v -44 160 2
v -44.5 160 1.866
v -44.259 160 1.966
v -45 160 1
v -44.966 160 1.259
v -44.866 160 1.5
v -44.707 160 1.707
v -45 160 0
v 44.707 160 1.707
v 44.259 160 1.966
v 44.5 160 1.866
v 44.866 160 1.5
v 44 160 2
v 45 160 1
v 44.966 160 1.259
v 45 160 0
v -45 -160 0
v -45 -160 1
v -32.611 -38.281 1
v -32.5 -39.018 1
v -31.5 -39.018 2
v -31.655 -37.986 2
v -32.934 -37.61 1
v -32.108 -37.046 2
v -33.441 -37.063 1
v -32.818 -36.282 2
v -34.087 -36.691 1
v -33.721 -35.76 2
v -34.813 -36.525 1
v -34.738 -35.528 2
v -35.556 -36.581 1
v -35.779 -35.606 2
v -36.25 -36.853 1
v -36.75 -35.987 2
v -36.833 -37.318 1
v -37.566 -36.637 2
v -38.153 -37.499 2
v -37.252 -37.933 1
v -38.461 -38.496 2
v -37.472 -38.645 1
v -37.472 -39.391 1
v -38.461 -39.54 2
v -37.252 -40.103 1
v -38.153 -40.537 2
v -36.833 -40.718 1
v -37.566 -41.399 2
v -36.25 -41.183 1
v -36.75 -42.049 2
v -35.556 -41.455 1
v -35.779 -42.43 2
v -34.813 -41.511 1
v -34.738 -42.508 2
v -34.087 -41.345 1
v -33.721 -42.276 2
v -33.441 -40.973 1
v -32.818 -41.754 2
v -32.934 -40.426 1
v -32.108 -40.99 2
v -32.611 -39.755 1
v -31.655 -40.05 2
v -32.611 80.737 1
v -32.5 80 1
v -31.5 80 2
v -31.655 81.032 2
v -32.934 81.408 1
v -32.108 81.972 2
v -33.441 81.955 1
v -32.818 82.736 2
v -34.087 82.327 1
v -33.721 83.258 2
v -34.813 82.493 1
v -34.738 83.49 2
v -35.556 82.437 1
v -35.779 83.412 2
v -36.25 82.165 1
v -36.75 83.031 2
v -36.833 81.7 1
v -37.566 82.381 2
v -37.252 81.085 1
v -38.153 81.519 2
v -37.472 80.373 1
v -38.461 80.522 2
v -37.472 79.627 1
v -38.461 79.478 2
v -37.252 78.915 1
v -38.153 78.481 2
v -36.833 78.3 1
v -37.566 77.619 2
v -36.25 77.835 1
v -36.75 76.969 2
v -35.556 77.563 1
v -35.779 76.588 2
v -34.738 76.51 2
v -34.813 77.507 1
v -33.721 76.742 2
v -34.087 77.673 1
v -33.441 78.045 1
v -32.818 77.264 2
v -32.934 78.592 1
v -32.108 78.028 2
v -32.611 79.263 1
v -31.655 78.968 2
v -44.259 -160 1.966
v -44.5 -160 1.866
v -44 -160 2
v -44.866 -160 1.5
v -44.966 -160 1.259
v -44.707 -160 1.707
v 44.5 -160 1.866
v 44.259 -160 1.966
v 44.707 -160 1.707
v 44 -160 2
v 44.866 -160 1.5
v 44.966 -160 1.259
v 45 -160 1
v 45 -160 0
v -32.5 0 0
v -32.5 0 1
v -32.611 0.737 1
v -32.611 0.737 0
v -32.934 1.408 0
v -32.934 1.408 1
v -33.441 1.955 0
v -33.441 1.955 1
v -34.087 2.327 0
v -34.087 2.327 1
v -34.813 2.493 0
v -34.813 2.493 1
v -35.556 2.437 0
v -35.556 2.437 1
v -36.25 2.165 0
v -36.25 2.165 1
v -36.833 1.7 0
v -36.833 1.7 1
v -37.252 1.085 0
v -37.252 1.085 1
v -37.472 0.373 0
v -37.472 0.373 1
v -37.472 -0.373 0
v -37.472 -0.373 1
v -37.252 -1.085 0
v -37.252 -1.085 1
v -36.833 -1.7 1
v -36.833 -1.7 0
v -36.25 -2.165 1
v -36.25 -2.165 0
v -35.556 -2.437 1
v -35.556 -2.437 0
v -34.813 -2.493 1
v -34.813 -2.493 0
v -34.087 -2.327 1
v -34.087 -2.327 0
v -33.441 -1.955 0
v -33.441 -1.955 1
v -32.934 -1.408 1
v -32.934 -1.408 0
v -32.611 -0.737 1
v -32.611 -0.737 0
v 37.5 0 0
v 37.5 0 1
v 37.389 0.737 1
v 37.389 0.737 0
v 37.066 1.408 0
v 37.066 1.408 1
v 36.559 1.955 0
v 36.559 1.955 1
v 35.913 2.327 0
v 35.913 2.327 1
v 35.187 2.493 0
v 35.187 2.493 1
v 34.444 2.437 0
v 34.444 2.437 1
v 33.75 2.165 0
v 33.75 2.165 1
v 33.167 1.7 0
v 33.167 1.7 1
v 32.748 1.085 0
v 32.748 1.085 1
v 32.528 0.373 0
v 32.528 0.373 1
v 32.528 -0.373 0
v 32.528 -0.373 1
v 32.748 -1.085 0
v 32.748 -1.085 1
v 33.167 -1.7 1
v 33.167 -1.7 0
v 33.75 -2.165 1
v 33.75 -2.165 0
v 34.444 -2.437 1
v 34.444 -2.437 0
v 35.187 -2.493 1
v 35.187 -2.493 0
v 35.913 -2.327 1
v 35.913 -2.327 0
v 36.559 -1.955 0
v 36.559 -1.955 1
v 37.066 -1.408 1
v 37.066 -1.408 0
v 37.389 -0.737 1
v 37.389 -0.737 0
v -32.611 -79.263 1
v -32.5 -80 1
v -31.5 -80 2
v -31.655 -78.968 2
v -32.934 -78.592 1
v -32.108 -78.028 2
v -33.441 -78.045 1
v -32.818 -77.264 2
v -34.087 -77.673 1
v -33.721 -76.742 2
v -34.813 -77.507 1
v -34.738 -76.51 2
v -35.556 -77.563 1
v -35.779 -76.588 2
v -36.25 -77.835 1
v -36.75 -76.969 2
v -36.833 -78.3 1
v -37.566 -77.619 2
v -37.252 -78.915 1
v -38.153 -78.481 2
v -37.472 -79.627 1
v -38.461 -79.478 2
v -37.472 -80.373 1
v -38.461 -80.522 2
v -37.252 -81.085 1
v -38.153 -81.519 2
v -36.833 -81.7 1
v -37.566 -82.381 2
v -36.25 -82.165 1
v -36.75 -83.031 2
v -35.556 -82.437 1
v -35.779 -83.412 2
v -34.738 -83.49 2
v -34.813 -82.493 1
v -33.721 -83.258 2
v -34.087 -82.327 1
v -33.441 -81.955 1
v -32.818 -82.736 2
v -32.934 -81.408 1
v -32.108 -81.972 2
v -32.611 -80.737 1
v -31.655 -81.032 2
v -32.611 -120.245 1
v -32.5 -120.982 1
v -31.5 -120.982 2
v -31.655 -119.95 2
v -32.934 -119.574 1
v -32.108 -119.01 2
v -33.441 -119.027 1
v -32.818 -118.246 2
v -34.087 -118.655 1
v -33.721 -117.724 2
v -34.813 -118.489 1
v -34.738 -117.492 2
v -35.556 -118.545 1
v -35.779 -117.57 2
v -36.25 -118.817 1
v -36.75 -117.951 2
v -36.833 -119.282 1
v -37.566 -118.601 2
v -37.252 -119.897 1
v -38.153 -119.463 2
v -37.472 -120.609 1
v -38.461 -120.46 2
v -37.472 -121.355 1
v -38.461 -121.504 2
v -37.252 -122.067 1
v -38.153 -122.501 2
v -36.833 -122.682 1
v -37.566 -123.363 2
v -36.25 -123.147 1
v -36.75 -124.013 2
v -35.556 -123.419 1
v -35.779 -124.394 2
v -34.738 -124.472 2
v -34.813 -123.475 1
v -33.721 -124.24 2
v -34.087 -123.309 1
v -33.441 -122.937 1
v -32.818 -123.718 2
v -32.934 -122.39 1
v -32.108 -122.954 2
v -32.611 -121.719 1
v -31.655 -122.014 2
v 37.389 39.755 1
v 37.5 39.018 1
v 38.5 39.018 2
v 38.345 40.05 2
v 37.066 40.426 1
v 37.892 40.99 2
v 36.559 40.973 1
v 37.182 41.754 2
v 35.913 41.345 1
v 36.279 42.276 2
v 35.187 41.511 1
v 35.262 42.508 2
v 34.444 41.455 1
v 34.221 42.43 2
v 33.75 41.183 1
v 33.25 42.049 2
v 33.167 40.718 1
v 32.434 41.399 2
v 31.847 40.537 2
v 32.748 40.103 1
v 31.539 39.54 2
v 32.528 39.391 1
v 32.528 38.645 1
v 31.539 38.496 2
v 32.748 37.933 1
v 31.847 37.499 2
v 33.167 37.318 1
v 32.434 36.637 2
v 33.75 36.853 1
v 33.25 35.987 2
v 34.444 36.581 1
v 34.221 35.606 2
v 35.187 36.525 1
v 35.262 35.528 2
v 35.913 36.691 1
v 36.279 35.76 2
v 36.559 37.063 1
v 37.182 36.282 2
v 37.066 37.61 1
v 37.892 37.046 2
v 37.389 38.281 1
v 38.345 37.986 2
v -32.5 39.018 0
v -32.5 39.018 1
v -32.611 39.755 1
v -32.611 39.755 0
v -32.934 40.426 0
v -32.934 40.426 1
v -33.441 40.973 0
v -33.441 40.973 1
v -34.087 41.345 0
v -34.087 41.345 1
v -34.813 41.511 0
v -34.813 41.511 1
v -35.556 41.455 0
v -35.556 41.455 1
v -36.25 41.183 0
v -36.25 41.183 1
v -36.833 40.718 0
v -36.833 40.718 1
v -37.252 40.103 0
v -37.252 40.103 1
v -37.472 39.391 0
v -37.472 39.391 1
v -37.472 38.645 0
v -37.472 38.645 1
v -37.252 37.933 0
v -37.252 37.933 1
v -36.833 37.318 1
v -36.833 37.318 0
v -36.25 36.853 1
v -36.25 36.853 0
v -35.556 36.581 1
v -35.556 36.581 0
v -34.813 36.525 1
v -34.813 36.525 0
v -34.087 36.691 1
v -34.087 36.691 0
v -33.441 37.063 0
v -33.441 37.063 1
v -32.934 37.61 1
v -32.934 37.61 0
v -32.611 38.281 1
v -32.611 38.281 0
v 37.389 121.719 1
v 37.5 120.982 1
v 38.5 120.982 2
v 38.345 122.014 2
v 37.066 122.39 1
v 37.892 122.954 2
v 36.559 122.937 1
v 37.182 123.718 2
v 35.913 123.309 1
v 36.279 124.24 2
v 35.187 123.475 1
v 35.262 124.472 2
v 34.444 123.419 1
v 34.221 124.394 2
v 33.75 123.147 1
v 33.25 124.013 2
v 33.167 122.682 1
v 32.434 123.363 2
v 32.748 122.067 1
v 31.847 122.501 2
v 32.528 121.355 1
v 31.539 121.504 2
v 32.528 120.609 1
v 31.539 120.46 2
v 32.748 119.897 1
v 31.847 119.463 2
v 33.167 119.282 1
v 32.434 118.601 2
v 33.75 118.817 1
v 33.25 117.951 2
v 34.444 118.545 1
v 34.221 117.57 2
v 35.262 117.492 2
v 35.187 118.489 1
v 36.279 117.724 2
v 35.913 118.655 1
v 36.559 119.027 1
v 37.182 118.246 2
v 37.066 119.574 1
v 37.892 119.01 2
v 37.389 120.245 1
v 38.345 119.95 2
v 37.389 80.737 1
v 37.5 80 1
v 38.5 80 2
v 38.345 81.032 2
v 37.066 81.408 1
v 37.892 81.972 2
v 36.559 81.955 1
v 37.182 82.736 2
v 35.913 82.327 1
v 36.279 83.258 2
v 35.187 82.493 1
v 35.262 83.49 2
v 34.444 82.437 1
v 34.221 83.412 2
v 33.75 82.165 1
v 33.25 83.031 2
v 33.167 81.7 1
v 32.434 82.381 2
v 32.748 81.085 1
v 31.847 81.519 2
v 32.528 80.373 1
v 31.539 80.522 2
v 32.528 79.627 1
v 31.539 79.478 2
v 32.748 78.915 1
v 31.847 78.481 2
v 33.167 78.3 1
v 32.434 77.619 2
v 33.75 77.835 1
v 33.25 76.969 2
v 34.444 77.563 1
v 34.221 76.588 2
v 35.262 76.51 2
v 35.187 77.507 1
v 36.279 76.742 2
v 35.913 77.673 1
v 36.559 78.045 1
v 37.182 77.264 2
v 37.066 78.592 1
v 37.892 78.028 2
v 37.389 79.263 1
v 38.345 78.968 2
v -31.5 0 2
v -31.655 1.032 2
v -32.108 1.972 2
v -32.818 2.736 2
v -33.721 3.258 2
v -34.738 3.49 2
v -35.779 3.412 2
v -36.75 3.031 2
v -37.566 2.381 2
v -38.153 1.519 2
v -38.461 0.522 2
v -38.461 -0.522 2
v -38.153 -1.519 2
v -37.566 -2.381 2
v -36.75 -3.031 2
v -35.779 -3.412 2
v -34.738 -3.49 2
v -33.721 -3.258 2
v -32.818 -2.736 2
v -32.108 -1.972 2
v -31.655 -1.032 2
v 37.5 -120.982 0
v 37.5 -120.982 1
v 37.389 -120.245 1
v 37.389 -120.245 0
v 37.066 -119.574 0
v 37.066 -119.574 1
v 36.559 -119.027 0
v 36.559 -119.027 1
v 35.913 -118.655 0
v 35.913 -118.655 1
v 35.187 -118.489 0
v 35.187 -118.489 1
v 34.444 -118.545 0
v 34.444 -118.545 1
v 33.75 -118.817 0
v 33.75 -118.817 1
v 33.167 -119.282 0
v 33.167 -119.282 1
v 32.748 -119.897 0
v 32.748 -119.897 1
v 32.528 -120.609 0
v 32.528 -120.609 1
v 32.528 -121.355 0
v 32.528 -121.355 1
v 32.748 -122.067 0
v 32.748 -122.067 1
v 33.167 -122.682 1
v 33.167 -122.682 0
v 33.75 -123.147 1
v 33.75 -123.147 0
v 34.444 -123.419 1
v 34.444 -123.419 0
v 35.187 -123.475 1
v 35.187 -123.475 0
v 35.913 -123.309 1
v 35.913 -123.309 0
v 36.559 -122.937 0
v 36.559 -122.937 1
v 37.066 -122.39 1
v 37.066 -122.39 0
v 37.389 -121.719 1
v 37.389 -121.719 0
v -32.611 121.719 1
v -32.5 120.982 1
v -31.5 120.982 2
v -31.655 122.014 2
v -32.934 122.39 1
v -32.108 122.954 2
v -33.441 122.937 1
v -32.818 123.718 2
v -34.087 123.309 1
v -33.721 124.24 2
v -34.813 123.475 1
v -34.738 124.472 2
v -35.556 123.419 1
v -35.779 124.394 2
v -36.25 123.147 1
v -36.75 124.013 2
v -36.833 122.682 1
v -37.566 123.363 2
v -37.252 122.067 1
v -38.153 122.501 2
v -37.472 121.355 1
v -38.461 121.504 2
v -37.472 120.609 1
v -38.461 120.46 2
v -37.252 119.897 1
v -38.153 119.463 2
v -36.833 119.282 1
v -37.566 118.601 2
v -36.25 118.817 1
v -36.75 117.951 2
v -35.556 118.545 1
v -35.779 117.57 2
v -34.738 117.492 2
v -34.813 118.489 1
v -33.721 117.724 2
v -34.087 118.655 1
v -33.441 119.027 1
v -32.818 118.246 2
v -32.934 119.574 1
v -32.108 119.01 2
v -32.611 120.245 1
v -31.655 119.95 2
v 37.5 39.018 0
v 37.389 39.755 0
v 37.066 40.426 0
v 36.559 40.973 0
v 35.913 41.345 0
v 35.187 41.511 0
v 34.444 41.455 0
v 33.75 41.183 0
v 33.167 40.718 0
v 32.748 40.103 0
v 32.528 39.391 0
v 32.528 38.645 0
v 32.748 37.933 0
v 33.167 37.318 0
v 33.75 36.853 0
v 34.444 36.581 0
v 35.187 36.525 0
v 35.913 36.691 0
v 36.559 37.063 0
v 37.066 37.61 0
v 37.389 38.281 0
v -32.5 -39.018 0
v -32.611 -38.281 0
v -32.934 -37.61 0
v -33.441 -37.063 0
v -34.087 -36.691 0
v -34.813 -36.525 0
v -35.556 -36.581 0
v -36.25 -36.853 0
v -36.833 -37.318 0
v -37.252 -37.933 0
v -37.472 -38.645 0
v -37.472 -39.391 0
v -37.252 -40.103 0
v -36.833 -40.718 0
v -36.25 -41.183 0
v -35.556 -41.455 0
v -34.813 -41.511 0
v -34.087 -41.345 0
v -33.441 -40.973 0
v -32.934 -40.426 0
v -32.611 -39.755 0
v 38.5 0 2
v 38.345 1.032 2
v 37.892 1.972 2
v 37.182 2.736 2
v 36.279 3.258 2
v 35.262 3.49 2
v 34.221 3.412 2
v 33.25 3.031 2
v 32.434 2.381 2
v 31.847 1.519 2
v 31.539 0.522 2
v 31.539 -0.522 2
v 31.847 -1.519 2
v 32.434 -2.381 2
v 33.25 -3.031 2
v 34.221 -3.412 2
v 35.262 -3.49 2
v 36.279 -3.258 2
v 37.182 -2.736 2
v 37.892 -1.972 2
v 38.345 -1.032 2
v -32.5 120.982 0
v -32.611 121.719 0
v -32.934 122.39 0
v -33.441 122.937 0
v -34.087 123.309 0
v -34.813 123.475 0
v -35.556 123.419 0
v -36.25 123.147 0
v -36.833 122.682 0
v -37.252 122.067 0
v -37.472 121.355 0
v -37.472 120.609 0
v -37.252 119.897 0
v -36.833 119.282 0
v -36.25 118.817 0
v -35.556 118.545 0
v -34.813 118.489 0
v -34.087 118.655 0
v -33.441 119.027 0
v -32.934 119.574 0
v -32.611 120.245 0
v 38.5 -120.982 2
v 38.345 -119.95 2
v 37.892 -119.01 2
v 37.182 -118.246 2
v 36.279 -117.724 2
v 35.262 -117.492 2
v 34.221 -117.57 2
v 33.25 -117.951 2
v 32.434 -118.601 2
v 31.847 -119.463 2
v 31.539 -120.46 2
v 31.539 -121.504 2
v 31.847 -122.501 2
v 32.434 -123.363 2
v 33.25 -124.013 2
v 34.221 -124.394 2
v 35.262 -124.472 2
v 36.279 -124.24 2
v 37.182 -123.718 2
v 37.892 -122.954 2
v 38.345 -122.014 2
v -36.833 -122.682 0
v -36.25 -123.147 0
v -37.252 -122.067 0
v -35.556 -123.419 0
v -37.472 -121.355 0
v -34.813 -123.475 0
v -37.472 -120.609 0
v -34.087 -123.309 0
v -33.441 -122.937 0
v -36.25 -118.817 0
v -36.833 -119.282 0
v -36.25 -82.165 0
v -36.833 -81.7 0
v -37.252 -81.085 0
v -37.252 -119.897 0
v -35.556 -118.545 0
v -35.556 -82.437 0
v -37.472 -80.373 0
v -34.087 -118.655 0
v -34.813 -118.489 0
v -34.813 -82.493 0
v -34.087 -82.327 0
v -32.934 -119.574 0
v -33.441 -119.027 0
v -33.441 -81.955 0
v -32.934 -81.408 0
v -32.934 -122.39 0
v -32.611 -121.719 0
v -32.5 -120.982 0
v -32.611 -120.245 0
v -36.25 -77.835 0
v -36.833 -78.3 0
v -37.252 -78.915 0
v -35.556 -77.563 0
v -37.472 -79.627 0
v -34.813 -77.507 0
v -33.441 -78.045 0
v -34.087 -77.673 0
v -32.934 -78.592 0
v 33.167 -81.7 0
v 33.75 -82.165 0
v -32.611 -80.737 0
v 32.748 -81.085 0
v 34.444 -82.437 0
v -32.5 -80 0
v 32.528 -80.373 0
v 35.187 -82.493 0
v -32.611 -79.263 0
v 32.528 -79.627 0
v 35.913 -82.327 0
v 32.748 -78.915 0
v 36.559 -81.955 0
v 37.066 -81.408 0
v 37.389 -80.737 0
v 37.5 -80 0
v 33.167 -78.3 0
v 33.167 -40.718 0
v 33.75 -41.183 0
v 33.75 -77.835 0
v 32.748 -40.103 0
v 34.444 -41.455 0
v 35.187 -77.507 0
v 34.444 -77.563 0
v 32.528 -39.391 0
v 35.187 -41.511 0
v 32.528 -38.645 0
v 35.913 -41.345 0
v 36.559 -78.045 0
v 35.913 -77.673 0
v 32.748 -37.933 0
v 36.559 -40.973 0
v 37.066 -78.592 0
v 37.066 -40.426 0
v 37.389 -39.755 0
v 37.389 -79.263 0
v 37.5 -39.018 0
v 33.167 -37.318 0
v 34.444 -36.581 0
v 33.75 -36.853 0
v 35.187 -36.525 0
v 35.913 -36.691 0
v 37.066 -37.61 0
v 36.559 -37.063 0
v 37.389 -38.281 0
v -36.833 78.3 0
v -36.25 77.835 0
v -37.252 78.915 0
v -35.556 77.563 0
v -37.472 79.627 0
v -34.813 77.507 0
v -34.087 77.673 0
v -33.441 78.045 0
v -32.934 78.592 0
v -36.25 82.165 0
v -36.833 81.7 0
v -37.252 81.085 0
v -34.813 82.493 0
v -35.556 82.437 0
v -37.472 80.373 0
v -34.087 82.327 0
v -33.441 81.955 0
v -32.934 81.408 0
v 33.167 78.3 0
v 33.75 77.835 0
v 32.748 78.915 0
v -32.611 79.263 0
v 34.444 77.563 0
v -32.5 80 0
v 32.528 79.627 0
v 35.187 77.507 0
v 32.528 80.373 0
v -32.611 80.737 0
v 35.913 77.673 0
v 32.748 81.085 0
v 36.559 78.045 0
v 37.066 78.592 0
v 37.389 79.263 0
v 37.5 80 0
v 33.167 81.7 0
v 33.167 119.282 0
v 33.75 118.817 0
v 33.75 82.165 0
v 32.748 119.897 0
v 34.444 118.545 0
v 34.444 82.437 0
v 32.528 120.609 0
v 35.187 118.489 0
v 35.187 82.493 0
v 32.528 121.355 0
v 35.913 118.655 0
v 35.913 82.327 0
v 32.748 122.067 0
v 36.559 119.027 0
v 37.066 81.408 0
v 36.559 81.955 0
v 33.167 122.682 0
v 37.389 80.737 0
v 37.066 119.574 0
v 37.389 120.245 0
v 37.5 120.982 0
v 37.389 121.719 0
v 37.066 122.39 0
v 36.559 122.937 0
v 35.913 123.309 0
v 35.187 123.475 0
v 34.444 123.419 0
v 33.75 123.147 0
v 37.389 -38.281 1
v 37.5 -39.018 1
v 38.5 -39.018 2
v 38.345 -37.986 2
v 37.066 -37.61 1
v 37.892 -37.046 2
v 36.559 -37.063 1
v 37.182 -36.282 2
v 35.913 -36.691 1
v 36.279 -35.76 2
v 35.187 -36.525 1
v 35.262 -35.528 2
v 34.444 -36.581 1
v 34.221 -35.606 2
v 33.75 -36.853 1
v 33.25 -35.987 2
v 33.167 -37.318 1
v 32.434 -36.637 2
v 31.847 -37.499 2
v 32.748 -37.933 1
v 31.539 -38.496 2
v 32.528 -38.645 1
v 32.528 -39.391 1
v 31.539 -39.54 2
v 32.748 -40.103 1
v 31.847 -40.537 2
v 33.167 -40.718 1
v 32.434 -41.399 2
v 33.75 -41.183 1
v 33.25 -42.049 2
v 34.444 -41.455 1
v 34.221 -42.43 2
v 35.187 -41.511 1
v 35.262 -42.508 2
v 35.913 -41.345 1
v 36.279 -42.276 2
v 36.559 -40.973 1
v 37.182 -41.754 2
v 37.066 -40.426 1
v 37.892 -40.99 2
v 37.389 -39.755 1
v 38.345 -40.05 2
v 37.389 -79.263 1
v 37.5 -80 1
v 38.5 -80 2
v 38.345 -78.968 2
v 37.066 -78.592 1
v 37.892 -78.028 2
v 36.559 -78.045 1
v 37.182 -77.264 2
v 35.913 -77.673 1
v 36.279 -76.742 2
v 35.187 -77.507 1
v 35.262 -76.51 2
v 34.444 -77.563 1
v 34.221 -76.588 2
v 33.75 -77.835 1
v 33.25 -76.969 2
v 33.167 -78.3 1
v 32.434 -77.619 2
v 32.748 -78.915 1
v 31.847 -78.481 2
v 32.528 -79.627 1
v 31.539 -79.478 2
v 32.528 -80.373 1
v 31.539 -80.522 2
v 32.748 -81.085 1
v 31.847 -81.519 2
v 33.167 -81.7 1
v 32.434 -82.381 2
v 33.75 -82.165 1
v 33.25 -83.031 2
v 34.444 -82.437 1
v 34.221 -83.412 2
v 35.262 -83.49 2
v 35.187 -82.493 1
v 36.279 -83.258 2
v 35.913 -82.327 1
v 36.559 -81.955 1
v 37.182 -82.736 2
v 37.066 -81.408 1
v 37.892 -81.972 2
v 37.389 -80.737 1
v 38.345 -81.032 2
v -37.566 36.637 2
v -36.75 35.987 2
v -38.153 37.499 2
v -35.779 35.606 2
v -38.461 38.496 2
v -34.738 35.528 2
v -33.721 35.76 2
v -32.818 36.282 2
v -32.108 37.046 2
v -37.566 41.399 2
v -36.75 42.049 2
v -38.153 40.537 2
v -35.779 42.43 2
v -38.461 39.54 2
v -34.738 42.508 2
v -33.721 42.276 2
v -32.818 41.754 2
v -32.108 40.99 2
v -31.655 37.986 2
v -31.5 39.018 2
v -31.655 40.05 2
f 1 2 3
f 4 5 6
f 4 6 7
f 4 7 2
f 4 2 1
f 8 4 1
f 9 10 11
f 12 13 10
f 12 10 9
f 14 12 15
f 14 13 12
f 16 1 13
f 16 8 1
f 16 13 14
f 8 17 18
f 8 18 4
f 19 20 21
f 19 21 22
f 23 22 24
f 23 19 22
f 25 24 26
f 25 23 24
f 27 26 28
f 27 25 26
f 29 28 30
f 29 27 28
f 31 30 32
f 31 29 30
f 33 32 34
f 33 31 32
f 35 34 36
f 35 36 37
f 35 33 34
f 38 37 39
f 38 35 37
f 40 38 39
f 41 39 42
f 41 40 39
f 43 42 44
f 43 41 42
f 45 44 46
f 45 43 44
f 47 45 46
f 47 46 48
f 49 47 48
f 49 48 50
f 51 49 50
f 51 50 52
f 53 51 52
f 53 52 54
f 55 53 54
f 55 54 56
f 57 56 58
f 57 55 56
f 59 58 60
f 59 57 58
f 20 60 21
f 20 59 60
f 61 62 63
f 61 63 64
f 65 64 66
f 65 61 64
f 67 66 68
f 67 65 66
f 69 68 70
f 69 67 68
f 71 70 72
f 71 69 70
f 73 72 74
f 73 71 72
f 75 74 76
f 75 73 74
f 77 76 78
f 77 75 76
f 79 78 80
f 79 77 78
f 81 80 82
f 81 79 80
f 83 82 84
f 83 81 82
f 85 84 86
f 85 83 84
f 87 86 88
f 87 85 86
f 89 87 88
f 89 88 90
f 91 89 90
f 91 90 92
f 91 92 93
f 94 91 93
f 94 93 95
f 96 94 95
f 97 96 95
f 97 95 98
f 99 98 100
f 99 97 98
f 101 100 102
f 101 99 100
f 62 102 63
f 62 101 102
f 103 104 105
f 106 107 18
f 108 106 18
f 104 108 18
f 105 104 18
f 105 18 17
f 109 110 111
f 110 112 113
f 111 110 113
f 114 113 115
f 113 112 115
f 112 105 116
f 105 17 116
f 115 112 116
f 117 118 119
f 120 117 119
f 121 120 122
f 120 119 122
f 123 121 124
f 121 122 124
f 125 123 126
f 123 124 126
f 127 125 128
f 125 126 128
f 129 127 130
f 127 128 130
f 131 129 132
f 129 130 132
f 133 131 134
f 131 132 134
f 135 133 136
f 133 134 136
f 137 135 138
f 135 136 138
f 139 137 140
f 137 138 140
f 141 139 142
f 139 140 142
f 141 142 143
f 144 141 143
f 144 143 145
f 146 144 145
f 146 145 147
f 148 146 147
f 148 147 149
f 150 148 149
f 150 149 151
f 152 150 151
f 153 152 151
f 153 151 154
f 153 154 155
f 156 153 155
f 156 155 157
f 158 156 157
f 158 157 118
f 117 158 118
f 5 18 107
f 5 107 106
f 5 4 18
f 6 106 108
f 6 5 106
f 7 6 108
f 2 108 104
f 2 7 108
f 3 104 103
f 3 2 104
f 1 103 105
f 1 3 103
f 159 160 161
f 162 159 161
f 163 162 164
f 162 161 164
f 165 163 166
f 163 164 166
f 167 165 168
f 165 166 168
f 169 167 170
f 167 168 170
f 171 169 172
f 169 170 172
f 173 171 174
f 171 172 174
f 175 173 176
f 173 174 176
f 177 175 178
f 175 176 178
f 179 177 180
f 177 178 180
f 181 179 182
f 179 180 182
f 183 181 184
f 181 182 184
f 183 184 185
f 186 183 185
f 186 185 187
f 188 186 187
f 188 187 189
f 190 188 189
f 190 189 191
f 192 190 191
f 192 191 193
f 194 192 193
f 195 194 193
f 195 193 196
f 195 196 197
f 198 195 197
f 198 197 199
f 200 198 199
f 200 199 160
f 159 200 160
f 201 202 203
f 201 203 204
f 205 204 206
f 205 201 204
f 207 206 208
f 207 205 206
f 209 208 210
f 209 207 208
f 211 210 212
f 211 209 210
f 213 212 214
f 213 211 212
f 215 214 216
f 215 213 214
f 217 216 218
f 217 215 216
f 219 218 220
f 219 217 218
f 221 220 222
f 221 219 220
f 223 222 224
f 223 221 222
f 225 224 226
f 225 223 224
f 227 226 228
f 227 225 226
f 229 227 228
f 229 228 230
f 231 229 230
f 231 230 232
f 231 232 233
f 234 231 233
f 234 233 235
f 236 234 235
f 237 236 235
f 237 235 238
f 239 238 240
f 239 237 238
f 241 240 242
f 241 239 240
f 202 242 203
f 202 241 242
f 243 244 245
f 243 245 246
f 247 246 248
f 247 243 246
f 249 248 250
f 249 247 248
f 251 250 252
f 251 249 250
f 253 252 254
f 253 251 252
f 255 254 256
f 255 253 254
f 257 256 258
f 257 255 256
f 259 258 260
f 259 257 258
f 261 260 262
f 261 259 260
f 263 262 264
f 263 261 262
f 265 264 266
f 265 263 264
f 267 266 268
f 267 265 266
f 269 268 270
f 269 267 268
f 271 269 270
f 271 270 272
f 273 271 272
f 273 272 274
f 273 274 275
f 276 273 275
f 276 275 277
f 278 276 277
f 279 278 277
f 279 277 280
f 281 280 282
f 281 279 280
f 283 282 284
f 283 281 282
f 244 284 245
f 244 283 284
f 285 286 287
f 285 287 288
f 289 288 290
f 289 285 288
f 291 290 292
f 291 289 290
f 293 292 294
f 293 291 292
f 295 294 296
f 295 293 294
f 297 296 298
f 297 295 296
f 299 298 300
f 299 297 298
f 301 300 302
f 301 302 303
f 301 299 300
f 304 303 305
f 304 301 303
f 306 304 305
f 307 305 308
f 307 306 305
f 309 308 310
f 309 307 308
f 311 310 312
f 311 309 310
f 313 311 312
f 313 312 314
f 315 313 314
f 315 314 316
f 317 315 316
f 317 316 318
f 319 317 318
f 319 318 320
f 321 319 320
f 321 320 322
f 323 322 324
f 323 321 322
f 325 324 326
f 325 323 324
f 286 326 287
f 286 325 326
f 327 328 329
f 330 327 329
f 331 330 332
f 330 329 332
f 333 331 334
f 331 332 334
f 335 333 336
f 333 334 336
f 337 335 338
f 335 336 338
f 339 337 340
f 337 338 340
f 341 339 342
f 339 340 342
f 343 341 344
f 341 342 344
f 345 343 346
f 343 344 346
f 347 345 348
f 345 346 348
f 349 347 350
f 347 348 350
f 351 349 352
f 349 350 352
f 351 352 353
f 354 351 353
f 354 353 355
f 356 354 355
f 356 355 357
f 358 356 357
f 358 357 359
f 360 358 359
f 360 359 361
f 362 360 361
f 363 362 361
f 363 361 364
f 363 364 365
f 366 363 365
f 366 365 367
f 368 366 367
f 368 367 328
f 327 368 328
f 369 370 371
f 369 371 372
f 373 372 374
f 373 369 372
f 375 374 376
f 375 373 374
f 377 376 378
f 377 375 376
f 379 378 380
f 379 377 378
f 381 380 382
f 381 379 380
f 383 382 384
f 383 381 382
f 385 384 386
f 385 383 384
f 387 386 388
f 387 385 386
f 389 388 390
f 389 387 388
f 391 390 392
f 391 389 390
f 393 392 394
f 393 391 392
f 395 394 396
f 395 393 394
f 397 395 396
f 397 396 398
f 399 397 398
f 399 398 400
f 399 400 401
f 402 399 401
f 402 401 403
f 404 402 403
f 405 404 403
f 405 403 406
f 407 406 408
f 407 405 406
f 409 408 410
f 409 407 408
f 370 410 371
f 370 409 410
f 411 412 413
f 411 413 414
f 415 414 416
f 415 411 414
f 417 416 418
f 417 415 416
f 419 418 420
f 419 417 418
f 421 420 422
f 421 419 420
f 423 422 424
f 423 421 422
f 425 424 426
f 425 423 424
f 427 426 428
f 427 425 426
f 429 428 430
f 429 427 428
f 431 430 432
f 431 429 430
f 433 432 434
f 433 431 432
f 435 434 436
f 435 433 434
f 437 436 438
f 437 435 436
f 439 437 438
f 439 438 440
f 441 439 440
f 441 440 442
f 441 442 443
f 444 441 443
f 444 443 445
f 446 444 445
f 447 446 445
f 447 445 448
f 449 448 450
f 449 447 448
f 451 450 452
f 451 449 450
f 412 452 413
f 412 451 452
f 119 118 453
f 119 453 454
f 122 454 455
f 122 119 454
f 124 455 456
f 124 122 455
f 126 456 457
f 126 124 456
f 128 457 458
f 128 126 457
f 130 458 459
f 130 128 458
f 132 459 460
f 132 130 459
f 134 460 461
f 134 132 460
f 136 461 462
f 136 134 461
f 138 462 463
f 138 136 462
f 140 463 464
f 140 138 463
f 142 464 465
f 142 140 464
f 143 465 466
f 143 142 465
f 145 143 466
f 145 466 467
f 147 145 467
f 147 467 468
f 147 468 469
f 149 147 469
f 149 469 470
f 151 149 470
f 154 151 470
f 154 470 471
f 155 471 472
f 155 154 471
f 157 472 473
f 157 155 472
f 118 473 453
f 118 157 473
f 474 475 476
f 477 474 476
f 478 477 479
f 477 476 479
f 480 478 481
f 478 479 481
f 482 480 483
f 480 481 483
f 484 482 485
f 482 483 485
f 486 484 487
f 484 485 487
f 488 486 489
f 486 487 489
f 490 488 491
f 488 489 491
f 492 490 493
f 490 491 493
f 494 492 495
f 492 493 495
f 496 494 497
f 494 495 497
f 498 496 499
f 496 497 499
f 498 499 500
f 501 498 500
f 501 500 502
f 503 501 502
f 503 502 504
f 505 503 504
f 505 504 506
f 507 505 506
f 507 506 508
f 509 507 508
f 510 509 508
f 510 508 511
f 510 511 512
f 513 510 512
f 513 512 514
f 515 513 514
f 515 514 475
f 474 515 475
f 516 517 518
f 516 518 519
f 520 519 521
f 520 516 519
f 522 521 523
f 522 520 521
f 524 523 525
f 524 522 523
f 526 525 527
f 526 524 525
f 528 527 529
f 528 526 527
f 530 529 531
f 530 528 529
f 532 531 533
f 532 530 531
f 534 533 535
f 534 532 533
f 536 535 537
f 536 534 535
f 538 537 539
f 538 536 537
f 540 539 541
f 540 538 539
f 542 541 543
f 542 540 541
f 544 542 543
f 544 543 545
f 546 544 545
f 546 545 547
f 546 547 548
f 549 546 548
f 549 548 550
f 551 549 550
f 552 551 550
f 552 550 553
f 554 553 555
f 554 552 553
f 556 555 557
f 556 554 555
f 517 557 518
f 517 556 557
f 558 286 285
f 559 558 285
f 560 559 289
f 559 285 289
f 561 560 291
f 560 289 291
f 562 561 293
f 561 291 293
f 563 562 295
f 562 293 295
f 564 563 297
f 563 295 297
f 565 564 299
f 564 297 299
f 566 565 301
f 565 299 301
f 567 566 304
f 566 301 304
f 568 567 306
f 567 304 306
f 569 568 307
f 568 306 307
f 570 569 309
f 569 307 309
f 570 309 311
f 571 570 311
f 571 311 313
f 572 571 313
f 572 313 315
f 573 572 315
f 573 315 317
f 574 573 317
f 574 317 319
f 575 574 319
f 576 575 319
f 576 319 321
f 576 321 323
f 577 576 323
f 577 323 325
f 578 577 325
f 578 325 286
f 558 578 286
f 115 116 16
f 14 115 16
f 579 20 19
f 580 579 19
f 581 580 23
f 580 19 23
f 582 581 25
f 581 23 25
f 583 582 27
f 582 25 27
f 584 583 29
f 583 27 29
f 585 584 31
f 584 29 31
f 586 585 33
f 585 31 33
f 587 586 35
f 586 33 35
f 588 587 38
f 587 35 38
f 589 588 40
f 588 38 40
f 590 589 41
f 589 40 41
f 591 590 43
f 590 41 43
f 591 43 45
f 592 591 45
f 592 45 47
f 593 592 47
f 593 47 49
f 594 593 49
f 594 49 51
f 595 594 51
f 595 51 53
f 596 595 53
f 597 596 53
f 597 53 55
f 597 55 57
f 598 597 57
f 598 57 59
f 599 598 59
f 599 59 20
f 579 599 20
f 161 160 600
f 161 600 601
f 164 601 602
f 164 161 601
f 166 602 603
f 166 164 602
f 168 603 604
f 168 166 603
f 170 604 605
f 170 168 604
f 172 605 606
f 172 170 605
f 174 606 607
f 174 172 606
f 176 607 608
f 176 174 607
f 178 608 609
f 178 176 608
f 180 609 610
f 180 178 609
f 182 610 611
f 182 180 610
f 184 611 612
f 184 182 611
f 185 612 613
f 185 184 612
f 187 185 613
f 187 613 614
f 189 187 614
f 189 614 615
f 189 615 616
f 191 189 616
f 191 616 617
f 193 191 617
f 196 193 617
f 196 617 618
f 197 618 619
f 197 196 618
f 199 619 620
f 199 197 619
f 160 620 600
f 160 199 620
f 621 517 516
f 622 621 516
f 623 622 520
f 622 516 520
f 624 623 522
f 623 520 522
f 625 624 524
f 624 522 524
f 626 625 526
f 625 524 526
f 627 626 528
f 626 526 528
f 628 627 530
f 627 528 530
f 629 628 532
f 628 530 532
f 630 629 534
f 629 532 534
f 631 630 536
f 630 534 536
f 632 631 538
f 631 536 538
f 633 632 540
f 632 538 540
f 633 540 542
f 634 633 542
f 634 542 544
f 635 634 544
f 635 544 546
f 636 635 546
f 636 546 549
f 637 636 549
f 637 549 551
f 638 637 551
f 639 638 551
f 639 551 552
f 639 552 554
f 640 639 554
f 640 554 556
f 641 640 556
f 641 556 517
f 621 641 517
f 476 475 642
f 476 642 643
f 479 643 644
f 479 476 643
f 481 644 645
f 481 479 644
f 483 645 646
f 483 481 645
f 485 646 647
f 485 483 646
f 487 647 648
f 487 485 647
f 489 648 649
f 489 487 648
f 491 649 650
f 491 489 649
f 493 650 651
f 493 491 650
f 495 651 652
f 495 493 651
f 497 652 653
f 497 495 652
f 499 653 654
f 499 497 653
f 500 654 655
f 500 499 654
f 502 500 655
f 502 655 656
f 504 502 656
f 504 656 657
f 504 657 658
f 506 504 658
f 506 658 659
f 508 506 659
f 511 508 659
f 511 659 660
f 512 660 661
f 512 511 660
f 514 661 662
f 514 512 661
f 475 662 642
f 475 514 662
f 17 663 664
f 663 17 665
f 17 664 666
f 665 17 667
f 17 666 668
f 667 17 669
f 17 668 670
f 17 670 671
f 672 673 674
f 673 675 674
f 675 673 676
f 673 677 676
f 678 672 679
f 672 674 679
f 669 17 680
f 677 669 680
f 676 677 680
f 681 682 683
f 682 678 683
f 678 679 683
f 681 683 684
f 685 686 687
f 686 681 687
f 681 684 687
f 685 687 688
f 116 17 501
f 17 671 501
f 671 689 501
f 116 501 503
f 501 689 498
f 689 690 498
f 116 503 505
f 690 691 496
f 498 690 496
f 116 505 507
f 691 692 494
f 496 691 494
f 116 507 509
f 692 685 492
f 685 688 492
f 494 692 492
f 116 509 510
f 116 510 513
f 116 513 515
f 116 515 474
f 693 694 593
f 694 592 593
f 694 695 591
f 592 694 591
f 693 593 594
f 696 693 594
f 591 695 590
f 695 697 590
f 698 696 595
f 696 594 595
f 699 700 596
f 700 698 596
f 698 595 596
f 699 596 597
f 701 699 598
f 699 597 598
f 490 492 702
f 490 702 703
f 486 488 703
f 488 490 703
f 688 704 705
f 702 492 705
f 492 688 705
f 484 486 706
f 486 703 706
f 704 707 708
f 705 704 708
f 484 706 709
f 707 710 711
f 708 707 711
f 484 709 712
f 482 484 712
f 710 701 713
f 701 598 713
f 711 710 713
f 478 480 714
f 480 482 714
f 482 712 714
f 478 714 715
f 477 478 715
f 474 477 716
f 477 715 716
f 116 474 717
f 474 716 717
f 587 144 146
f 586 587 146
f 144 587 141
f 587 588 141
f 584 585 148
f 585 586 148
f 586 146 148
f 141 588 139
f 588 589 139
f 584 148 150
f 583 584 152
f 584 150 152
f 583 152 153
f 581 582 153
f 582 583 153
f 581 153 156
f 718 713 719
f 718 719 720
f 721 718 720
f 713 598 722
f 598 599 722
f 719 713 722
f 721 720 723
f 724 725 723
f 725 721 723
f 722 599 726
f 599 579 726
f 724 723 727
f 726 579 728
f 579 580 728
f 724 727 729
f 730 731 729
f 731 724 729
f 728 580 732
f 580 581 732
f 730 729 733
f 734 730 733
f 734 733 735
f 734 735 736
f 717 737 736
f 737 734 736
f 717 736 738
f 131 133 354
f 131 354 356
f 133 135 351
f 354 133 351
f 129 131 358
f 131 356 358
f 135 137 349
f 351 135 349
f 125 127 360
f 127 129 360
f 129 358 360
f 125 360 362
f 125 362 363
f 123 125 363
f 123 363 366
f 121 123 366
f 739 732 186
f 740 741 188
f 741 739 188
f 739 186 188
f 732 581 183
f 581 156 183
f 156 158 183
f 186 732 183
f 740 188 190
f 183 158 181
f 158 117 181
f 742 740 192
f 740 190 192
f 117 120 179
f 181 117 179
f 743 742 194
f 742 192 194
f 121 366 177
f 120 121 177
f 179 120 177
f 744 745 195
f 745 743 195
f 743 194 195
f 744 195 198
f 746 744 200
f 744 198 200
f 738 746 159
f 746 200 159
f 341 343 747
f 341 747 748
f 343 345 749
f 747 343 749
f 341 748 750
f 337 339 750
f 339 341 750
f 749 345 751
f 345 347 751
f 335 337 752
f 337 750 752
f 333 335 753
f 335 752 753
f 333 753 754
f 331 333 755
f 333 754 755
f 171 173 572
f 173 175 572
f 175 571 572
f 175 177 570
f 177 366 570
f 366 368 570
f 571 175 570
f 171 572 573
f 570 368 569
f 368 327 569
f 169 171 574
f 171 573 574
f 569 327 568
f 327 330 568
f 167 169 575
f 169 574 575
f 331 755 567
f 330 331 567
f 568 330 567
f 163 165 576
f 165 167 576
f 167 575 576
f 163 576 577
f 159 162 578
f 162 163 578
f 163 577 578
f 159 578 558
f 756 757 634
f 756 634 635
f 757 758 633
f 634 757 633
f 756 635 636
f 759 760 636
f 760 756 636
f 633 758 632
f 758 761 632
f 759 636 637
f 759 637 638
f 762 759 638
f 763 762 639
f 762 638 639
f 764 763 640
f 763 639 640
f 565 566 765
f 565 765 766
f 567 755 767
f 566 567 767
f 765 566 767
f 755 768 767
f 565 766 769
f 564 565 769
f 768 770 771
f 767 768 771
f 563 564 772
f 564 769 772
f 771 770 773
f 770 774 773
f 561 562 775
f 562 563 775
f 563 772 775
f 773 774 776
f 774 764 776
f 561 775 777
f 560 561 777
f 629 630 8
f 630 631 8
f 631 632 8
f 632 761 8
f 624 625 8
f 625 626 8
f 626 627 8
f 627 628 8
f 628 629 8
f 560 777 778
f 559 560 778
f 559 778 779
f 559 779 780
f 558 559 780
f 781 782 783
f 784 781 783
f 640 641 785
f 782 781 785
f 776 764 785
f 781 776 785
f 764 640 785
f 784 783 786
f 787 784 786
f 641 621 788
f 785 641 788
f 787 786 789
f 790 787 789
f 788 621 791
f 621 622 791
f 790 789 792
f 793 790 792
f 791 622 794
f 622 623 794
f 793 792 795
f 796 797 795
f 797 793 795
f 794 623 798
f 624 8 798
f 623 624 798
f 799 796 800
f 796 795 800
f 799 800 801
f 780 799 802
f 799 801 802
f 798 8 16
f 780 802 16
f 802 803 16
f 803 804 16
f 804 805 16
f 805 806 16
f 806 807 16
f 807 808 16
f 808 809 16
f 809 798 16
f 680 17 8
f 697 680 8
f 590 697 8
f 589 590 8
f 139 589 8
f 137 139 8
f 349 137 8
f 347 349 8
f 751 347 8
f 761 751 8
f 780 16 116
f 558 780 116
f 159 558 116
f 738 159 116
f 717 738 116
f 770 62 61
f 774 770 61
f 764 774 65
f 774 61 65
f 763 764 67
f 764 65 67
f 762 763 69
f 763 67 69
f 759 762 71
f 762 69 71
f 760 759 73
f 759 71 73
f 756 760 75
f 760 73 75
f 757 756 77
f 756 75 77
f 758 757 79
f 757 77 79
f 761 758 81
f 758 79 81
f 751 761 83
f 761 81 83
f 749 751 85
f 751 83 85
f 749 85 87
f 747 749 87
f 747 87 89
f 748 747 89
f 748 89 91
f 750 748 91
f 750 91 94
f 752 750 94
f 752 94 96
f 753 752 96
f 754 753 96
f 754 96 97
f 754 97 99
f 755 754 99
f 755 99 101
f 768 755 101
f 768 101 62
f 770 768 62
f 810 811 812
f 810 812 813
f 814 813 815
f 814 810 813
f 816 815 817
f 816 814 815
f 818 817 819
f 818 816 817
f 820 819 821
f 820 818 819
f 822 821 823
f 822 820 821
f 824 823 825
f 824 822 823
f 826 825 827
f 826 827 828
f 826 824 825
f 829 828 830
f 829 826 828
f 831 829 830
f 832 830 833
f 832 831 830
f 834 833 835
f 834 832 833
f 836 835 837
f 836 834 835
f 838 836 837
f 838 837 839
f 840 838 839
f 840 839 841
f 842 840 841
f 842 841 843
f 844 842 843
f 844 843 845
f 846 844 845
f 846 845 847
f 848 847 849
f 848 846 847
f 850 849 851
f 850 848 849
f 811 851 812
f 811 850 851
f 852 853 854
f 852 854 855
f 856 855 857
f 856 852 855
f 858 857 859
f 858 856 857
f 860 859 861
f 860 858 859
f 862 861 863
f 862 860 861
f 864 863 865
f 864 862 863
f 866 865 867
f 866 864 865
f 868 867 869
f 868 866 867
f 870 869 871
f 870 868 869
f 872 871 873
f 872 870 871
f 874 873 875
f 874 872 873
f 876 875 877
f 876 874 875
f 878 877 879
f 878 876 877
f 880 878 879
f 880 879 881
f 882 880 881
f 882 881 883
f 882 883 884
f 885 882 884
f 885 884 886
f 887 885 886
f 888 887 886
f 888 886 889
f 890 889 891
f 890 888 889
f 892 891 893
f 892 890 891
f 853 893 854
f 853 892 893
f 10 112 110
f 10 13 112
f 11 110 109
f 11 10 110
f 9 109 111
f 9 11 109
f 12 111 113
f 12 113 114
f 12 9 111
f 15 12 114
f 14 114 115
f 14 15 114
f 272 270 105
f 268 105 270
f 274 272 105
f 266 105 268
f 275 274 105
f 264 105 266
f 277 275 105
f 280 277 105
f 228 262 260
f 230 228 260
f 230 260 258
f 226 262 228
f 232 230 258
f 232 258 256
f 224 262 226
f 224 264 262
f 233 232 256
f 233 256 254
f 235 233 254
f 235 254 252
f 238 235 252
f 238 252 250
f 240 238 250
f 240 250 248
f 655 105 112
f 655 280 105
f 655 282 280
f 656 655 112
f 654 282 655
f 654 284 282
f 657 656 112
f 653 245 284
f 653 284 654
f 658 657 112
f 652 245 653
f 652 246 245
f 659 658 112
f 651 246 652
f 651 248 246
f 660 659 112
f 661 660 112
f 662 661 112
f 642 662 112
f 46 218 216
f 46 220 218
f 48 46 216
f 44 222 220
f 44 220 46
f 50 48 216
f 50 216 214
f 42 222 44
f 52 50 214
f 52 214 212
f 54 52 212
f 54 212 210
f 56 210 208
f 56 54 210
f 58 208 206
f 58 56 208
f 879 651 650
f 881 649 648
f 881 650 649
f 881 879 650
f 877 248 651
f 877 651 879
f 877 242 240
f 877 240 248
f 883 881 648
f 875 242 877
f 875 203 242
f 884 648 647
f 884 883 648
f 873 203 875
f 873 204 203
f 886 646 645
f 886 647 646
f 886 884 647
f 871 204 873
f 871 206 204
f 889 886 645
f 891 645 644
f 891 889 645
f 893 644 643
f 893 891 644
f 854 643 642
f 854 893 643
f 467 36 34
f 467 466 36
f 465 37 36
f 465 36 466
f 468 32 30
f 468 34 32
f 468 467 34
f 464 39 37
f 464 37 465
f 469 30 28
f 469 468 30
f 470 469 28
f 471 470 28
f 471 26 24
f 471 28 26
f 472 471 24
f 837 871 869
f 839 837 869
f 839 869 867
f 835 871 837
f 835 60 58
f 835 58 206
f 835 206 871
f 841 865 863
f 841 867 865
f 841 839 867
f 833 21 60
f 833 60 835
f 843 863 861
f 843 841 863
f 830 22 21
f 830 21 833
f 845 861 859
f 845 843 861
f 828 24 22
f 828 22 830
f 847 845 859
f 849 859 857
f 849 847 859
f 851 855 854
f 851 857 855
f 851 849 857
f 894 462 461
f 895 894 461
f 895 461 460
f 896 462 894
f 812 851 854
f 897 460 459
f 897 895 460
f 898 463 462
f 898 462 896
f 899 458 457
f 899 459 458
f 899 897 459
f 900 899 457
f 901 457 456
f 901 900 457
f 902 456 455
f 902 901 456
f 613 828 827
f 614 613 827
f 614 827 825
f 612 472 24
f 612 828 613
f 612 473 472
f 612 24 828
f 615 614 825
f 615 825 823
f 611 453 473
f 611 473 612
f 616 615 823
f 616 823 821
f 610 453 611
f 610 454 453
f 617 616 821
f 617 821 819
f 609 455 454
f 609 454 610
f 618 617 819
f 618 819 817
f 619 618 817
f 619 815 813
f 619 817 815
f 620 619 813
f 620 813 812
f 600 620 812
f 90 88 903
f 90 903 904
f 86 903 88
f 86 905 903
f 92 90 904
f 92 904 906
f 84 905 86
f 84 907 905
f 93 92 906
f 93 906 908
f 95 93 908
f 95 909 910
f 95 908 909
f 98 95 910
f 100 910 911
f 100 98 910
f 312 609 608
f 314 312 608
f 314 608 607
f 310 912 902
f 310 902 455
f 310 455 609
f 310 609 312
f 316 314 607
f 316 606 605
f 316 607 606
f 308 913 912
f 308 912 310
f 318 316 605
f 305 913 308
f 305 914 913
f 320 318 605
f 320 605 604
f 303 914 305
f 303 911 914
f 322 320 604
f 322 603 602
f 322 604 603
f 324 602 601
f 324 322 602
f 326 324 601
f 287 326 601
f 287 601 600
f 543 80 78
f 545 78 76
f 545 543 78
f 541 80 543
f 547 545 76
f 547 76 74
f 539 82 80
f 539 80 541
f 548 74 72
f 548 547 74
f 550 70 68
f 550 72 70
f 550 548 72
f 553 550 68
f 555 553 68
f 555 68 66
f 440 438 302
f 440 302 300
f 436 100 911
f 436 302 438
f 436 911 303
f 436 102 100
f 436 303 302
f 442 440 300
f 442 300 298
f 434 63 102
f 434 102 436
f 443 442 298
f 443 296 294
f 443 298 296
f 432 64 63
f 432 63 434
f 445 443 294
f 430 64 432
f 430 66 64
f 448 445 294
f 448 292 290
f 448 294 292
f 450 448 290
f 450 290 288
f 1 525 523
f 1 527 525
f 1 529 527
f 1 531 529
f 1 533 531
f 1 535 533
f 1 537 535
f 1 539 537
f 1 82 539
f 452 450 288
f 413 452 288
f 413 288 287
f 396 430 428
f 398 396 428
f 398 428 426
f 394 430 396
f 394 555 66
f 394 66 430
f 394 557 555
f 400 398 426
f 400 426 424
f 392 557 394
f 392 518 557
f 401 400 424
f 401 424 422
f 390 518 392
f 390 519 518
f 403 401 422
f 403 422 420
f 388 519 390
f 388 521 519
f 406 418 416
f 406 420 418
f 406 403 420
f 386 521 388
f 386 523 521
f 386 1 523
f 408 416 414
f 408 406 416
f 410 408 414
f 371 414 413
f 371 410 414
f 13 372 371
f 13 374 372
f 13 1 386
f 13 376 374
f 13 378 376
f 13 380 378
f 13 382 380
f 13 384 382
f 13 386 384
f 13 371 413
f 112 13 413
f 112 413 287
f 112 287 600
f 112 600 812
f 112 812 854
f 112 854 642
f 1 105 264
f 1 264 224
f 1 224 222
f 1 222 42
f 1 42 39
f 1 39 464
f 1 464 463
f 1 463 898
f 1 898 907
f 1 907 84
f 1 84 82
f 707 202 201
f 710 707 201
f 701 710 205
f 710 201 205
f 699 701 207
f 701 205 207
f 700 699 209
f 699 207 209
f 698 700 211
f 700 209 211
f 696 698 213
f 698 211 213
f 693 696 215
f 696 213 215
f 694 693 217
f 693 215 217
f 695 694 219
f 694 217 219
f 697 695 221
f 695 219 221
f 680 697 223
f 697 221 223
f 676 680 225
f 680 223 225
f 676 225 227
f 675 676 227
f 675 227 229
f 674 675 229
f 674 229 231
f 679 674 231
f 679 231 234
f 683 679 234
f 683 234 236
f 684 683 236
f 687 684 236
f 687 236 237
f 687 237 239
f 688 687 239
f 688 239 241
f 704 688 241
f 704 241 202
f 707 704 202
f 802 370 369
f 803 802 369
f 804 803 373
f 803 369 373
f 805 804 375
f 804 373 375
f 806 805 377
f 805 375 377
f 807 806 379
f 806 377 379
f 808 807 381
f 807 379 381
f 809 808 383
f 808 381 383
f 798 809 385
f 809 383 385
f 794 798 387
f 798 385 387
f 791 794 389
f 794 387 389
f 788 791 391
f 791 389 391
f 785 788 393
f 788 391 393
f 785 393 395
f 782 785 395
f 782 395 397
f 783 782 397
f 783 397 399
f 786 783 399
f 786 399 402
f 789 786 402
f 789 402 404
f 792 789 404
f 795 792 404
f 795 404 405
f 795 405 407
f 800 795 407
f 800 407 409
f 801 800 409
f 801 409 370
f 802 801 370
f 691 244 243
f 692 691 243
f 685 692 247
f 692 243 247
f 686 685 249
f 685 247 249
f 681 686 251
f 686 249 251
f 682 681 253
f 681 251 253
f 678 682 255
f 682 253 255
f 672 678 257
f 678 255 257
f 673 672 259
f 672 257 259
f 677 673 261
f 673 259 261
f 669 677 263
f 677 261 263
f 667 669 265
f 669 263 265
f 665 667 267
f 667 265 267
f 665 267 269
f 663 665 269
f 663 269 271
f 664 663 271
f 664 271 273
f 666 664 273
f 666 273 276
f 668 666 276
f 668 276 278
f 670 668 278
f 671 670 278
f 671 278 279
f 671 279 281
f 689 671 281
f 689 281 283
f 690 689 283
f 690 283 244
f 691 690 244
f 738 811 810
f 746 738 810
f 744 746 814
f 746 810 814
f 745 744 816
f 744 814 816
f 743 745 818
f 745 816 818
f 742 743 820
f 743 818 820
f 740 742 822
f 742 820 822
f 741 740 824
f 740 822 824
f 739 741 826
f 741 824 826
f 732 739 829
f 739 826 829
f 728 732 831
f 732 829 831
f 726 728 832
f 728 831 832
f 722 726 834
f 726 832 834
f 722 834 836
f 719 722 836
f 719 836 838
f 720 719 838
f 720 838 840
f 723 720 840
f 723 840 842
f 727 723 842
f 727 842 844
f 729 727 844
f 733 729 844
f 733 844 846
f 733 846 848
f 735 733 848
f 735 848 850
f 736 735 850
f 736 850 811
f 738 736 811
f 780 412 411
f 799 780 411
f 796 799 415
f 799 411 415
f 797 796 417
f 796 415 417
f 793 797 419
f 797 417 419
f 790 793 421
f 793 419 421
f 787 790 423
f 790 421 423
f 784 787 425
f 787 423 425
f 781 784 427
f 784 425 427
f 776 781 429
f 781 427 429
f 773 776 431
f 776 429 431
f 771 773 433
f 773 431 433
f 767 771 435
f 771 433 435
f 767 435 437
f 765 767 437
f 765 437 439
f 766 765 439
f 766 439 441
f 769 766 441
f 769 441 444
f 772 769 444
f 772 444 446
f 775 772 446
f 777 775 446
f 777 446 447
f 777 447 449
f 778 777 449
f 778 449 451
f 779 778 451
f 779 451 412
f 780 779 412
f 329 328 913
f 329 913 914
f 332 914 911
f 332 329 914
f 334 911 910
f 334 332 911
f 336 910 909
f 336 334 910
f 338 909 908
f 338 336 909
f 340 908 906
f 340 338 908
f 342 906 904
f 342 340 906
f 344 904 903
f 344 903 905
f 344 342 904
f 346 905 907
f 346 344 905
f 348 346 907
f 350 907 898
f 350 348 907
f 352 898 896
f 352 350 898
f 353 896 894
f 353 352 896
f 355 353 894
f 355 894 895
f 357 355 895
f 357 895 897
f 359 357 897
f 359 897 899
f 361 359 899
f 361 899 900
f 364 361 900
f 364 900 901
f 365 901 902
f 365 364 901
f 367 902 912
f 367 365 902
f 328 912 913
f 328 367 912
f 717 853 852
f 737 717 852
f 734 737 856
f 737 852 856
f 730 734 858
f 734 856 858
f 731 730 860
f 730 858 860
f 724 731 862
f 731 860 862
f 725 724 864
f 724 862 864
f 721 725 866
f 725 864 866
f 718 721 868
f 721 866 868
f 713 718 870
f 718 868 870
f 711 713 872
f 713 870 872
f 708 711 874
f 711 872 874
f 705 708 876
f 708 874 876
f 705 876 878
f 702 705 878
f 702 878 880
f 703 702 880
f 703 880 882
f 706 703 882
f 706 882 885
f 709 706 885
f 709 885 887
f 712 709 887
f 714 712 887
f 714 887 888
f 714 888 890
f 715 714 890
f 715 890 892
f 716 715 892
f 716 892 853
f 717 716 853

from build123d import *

# Parameters (mm, degrees)
ESQUISSE1_W             = 90
ESQUISSE1_H             = 320
BOSS_EXTRU_1_DEPTH      = 2
ESQUISSE2_R             = 2.5
ENL_V_MAT_EXTRU_1_DEPTH = 45
CONG_2_R                = 1
CHANFREIN1_SIZE         = 1


with BuildPart() as part:
    # Esquisse1 → Boss.-Extru.1 (new body)
    with BuildSketch(Plane.XY):
        Rectangle(ESQUISSE1_W, ESQUISSE1_H)
    extrude(amount=BOSS_EXTRU_1_DEPTH)

    # Esquisse2 → Enlèv. mat.-Extru.1 (cut)
    with BuildSketch(Plane.XY.offset(2)):
        with Locations((-35, 120.982014683)):
            Circle(ESQUISSE2_R)
        with Locations((35, 120.982014683)):
            Circle(ESQUISSE2_R)
        with Locations((35, 80)):
            Circle(ESQUISSE2_R)
        with Locations((-35, 80)):
            Circle(ESQUISSE2_R)
        with Locations((-35, 39.017985317)):
            Circle(ESQUISSE2_R)
        with Locations((35, 39.017985317)):
            Circle(ESQUISSE2_R)
        with Locations((35, 0)):
            Circle(ESQUISSE2_R)
        with Locations((-35, 0)):
            Circle(ESQUISSE2_R)
        with Locations((-35, -39.017985317)):
            Circle(ESQUISSE2_R)
        with Locations((35, -39.017985317)):
            Circle(ESQUISSE2_R)
        with Locations((35, -80)):
            Circle(ESQUISSE2_R)
        with Locations((-35, -80)):
            Circle(ESQUISSE2_R)
        with Locations((35, -120.982014683)):
            Circle(ESQUISSE2_R)
        with Locations((-35, -120.982014683)):
            Circle(ESQUISSE2_R)
    extrude(amount=-ENL_V_MAT_EXTRU_1_DEPTH, mode=Mode.SUBTRACT)

    # Congé2
    cong_2_edges = [part.edges().sort_by_distance(p)[0] for p in [
        (45, 0, 2),
        (-45, 0, 2),
    ]]
    fillet(cong_2_edges, radius=CONG_2_R)

    # Chanfrein1
    chanfrein1_edges = [part.edges().sort_by_distance(p)[0] for p in [
        (-37.5, -39.017985317, 2),
        (-37.5, 0, 2),
        (32.5, 0, 2),
        (32.5, 39.017985317, 2),
        (-37.5, 39.017985317, 2),
        (-37.5, 80, 2),
        (32.5, 80, 2),
        (32.5, 120.982014683, 2),
        (-37.5, -120.982014683, 2),
        (32.5, -39.017985317, 2),
        (32.5, -80, 2),
        (-37.5, -80, 2),
        (32.5, -120.982014683, 2),
        (-37.5, 120.982014683, 2),
    ]]
    chamfer(chanfrein1_edges, length=CHANFREIN1_SIZE)


solid = part.part
